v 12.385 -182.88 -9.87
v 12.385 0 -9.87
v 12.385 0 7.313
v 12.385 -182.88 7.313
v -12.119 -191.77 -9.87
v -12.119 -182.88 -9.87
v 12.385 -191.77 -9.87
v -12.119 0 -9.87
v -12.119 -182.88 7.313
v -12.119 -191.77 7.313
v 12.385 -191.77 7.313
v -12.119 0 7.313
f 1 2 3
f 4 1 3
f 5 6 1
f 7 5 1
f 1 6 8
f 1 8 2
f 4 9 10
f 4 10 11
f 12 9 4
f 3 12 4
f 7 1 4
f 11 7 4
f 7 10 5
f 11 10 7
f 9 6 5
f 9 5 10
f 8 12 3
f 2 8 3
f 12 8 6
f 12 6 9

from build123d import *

# Parameters (mm, degrees)
F0_W      = 24.503531
F0_H      = 17.182354
F0_W_2    = 19.423531
F0_H_2    = 12.102353
F1_DEPTH  = 182.88
F1_FACE_W = 24.50353
F1_FACE_H = 17.182354
F2_DEPTH  = 8.89


with BuildPart() as f1:
    # F0 (on Front) → F1 (new body)
    with BuildSketch(Plane.XZ):
        with Locations((0.132886, -1.278598)):
            Rectangle(F0_W, F0_H)
        with Locations((0.132885, -1.278598)):
            Rectangle(F0_W_2, F0_H_2, mode=Mode.SUBTRACT)
        with Locations((0.132885, -1.278598)):
            Rectangle(F0_W_2, F0_H_2)
    extrude(amount=F1_DEPTH)

    # F1_face (on face) → F2 (join)
    with BuildSketch(Plane(origin=(0.132886, -182.88, -1.278598), x_dir=(1, 0, 0), z_dir=(0, -1, 0))):
        Rectangle(F1_FACE_W, F1_FACE_H)
    extrude(amount=F2_DEPTH)


solid = f1.part
